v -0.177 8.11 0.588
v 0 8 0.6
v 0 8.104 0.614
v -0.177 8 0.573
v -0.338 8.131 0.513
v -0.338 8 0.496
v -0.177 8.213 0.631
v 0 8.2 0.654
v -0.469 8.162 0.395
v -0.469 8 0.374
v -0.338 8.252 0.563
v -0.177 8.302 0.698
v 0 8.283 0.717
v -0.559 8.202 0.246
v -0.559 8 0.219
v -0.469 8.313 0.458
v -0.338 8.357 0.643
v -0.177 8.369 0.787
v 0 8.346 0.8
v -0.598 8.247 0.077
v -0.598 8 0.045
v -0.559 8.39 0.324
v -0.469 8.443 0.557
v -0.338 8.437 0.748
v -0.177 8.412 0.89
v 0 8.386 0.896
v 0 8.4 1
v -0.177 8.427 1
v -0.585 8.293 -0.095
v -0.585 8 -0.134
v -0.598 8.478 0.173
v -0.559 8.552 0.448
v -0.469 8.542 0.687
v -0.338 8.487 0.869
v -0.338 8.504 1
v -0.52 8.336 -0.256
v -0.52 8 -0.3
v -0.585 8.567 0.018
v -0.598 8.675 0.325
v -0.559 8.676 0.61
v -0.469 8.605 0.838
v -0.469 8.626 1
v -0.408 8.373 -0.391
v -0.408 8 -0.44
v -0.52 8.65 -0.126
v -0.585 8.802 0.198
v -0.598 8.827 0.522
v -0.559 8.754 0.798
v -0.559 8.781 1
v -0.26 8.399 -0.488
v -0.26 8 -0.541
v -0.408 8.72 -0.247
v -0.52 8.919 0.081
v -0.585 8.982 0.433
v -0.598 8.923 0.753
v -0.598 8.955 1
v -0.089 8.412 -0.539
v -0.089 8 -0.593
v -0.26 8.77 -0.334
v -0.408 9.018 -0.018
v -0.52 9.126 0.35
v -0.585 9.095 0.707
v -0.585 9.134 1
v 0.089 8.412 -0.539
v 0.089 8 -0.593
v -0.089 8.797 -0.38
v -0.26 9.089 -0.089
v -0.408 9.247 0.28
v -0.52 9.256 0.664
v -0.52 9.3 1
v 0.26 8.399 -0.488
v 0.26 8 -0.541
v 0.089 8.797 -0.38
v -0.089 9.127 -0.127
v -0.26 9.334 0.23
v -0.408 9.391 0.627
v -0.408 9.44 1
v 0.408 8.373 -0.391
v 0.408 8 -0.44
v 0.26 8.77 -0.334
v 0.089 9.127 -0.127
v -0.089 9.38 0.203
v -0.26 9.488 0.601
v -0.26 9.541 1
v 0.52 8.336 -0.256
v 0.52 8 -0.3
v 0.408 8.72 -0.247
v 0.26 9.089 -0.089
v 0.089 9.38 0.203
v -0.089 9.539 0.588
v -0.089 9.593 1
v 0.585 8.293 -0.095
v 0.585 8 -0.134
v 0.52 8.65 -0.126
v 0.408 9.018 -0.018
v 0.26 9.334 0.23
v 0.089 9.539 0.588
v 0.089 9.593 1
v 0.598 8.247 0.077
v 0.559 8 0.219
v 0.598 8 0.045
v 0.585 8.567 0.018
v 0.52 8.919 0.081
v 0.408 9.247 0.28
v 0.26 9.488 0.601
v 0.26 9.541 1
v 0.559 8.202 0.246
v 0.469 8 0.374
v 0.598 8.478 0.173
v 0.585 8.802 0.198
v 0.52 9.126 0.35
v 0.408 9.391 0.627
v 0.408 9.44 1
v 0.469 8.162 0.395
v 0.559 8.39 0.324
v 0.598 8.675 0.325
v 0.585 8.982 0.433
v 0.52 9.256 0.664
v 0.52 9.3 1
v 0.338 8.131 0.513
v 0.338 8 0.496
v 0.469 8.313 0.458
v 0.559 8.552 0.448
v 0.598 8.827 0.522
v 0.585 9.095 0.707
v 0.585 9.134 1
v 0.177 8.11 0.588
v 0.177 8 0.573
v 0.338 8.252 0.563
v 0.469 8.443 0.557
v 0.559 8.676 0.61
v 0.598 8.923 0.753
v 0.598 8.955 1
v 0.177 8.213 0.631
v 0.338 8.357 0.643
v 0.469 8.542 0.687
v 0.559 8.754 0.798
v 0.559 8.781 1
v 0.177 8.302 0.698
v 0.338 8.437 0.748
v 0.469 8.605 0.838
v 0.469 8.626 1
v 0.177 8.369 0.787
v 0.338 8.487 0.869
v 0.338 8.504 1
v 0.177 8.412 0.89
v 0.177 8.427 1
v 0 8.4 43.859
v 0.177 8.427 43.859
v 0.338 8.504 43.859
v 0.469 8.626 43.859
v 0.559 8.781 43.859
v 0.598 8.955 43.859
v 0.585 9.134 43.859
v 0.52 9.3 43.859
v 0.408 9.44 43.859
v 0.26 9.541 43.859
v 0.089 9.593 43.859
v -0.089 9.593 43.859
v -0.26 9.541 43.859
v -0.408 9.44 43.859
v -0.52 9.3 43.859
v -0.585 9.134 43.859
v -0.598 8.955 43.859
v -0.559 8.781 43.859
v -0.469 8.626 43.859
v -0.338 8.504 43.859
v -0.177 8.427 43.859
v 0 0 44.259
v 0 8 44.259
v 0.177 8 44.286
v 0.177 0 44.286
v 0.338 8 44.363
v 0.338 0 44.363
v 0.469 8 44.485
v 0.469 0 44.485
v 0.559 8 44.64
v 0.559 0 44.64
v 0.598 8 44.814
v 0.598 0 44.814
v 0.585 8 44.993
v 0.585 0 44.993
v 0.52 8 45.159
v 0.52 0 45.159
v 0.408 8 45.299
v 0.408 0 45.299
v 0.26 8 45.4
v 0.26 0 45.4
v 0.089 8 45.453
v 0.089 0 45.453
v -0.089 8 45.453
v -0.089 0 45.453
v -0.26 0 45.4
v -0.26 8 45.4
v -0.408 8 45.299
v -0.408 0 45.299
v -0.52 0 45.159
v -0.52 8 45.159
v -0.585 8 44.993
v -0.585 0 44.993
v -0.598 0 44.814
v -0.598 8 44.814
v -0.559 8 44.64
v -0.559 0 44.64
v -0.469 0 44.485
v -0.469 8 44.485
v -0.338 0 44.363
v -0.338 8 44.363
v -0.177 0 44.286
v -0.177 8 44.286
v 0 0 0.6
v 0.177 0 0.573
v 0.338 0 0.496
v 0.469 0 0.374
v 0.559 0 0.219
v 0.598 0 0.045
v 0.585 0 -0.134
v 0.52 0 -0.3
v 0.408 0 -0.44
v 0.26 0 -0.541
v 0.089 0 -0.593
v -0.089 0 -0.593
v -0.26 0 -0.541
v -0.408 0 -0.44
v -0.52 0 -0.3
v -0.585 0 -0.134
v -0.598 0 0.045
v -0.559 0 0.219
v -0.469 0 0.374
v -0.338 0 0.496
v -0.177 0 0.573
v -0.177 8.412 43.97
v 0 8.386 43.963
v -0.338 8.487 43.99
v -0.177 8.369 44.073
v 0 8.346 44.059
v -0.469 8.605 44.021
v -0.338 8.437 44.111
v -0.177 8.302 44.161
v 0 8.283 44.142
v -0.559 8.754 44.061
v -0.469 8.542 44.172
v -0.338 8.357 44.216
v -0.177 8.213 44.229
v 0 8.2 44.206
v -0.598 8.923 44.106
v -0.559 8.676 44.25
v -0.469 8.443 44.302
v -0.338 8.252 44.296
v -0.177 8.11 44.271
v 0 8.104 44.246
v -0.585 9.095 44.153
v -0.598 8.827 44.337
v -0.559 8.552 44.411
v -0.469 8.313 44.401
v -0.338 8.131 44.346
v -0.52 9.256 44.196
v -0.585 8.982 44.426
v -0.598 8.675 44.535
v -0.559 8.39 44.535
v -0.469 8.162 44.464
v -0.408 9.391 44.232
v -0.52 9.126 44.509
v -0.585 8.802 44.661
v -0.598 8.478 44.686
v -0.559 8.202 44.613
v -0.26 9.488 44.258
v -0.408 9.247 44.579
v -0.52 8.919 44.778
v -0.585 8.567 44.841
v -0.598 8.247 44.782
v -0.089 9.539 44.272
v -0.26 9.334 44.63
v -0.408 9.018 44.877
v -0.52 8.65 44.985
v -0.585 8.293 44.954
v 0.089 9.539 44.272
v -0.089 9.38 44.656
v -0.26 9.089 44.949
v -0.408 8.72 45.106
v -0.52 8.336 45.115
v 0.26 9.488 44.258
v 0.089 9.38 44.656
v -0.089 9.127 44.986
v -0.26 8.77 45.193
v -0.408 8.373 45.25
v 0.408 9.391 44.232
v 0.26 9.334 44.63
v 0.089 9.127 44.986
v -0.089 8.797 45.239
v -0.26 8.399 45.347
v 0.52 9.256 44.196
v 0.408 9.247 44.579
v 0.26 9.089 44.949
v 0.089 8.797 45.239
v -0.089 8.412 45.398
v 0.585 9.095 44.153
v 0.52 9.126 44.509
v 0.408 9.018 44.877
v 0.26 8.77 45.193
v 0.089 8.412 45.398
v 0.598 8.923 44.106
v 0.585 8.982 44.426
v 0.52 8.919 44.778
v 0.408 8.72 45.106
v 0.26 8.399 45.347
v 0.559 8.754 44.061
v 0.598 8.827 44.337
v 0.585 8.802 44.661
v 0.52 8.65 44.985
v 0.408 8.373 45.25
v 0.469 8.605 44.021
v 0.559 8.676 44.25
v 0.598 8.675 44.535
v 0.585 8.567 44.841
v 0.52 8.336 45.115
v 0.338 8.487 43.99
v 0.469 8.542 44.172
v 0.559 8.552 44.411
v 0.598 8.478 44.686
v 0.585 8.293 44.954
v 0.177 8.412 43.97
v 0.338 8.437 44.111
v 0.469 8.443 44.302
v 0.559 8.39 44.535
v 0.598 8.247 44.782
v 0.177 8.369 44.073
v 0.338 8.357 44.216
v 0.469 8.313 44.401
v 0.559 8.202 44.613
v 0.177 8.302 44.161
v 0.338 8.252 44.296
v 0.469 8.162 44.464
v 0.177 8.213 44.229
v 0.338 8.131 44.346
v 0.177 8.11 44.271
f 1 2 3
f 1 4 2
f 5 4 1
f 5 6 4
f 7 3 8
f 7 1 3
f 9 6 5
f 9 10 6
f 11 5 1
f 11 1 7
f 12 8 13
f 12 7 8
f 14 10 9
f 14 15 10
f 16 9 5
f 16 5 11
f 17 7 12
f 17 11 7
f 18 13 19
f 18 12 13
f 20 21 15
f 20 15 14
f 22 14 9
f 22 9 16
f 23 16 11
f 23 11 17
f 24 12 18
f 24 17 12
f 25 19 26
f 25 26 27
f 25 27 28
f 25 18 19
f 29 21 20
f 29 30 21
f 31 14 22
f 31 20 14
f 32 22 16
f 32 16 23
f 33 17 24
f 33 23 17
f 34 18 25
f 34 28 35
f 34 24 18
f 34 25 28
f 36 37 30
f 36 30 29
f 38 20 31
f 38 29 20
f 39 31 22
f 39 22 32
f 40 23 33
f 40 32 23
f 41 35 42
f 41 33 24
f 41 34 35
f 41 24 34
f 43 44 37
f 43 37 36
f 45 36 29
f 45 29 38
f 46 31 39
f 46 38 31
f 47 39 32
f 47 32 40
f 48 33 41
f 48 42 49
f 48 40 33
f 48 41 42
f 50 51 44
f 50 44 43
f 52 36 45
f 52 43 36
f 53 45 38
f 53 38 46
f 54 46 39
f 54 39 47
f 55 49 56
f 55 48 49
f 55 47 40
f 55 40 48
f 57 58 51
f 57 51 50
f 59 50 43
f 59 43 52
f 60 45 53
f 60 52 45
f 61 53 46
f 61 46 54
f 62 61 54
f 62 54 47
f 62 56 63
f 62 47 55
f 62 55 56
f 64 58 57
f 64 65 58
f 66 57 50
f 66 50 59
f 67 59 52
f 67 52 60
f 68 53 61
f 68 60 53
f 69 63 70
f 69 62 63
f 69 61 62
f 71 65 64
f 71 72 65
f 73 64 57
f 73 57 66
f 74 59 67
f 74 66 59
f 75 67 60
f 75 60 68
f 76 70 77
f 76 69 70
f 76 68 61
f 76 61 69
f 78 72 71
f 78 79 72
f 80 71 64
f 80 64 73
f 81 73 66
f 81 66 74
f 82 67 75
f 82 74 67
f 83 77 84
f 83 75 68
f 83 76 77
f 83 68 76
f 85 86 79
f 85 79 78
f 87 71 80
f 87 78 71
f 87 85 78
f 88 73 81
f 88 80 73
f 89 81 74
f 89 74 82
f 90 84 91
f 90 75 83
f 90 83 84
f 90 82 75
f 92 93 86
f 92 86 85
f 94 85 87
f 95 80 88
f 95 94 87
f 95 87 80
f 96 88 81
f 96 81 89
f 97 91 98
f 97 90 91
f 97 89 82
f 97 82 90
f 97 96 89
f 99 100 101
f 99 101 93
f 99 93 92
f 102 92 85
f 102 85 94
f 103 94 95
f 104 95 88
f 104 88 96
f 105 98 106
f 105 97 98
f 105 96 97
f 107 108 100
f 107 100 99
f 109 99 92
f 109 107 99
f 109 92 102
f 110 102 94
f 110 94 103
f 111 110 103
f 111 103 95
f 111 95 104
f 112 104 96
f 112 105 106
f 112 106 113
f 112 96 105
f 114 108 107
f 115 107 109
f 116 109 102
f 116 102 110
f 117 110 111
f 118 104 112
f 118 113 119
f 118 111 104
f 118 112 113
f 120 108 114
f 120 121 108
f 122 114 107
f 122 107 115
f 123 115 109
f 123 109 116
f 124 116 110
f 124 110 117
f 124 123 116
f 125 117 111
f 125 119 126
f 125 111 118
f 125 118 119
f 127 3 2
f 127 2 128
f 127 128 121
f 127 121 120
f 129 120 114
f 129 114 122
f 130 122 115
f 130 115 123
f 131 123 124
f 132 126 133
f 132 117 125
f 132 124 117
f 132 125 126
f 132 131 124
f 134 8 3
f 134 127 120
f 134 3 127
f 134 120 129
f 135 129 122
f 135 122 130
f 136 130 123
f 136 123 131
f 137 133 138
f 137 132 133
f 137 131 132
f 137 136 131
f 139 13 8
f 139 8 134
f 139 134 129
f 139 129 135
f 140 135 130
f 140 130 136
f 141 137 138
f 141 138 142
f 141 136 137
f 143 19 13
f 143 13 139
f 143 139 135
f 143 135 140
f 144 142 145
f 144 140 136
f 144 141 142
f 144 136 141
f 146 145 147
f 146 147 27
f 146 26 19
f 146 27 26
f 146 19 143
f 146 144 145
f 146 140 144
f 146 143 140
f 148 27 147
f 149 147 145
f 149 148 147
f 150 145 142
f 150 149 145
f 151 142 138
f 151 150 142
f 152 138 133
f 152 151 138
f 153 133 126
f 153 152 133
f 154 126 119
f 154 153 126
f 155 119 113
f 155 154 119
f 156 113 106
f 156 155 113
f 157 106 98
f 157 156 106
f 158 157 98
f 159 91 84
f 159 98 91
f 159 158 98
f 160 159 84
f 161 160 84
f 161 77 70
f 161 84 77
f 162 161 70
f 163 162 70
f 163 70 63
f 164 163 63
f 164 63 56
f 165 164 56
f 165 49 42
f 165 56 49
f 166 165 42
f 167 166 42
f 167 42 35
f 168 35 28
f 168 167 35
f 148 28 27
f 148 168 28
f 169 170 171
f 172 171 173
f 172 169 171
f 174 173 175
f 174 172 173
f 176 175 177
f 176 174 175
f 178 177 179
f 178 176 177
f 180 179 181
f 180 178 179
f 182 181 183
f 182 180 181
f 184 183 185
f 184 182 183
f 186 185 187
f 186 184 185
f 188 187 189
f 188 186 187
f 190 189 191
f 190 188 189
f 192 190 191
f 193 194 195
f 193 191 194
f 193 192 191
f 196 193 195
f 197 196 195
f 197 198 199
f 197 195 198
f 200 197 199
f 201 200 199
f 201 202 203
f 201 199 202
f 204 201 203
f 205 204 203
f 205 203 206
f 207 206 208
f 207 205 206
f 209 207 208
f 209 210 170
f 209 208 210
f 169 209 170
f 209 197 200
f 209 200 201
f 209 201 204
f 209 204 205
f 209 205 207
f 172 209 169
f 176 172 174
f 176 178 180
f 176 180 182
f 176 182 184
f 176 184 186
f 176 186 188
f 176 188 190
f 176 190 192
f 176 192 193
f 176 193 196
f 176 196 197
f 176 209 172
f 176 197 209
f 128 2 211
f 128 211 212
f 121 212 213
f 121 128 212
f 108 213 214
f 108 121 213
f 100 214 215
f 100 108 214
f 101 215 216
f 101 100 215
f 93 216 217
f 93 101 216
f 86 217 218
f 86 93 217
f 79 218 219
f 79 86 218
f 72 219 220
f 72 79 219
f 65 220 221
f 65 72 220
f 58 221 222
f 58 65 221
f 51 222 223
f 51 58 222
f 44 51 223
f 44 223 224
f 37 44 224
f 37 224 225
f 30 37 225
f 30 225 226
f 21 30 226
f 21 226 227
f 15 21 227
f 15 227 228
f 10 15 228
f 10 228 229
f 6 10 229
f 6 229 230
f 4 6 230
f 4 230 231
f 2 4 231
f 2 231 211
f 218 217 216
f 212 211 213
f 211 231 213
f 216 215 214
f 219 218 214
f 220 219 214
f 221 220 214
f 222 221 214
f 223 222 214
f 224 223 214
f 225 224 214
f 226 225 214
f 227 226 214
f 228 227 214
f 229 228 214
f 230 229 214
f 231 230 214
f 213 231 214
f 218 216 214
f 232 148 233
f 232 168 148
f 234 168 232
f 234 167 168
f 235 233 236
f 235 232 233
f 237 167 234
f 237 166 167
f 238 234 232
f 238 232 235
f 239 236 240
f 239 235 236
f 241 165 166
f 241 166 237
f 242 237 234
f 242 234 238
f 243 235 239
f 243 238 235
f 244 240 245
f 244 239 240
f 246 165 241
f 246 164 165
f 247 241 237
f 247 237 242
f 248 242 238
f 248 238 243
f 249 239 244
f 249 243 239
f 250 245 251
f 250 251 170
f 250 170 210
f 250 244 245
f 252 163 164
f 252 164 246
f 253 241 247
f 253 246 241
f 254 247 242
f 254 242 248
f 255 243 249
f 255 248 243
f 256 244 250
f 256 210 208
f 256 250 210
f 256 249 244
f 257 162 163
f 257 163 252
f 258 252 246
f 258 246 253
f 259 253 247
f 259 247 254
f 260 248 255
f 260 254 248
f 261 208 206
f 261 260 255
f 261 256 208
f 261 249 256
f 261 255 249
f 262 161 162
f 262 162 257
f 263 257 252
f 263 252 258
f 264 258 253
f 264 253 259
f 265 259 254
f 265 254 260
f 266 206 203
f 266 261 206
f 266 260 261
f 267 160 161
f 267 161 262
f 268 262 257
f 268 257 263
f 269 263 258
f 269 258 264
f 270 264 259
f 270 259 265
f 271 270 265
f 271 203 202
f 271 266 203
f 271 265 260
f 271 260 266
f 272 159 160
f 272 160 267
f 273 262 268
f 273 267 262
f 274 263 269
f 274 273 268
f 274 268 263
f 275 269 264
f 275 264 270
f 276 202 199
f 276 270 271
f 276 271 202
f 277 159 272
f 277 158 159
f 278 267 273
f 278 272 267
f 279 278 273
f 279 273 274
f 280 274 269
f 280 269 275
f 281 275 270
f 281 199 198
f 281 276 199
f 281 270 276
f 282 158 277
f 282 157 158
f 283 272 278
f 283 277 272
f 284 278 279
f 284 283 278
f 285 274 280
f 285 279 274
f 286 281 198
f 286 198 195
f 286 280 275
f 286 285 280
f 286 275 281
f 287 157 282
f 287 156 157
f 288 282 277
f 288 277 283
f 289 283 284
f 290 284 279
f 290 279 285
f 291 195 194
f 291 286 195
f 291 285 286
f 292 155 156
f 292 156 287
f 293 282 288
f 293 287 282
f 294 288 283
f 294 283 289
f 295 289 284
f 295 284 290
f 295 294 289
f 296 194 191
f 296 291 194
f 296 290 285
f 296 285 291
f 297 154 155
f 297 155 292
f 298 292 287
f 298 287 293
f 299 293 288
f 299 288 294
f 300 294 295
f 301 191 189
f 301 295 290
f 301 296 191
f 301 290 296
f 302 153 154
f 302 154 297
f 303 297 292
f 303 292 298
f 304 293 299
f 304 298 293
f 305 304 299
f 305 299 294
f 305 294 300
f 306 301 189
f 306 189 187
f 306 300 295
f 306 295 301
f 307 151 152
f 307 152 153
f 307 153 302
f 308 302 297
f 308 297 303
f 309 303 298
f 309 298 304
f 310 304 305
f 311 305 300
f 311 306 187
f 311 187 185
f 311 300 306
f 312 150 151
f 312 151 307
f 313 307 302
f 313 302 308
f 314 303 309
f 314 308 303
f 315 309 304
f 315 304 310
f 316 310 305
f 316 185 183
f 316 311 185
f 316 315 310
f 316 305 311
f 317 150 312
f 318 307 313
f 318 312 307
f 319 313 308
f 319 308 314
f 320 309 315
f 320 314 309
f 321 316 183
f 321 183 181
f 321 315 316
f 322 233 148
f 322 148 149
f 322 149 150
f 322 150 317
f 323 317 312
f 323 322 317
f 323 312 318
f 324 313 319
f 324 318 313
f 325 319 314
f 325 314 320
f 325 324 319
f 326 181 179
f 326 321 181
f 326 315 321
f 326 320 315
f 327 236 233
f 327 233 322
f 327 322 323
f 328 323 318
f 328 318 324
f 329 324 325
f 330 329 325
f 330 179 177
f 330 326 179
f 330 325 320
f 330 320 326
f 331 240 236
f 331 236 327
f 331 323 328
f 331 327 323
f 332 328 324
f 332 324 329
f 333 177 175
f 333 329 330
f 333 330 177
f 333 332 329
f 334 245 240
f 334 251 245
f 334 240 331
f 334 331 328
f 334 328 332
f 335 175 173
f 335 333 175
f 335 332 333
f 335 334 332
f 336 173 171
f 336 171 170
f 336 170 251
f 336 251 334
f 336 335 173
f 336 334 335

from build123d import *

# Parameters (mm, degrees)
SWEEP4_PROFILE_R = 0.6


with BuildPart() as part:
    # Sweep4: sweep along a path in Sketch4
    with BuildLine(Plane(origin=(0, 0, 0), x_dir=(0, 0, -1), z_dir=(1, 0, 0))) as sweep4_path:
        Line((0, 0), (0, 8))
        ThreePointArc((0, 8), (-0.292893219, 8.707106781), (-1, 9))
        Line((-1, 9), (-43.85922, 9))
        ThreePointArc((-43.85922, 9), (-44.566326781, 8.707106781), (-44.85922, 8))
        Line((-44.85922, 8), (-44.85922, 0))
    # Sweep4 profile (on start of the path) → Sweep4 (sweep)
    with BuildSketch(Plane.ZX):
        Circle(SWEEP4_PROFILE_R)
    sweep(path=sweep4_path.line)


solid = part.part
